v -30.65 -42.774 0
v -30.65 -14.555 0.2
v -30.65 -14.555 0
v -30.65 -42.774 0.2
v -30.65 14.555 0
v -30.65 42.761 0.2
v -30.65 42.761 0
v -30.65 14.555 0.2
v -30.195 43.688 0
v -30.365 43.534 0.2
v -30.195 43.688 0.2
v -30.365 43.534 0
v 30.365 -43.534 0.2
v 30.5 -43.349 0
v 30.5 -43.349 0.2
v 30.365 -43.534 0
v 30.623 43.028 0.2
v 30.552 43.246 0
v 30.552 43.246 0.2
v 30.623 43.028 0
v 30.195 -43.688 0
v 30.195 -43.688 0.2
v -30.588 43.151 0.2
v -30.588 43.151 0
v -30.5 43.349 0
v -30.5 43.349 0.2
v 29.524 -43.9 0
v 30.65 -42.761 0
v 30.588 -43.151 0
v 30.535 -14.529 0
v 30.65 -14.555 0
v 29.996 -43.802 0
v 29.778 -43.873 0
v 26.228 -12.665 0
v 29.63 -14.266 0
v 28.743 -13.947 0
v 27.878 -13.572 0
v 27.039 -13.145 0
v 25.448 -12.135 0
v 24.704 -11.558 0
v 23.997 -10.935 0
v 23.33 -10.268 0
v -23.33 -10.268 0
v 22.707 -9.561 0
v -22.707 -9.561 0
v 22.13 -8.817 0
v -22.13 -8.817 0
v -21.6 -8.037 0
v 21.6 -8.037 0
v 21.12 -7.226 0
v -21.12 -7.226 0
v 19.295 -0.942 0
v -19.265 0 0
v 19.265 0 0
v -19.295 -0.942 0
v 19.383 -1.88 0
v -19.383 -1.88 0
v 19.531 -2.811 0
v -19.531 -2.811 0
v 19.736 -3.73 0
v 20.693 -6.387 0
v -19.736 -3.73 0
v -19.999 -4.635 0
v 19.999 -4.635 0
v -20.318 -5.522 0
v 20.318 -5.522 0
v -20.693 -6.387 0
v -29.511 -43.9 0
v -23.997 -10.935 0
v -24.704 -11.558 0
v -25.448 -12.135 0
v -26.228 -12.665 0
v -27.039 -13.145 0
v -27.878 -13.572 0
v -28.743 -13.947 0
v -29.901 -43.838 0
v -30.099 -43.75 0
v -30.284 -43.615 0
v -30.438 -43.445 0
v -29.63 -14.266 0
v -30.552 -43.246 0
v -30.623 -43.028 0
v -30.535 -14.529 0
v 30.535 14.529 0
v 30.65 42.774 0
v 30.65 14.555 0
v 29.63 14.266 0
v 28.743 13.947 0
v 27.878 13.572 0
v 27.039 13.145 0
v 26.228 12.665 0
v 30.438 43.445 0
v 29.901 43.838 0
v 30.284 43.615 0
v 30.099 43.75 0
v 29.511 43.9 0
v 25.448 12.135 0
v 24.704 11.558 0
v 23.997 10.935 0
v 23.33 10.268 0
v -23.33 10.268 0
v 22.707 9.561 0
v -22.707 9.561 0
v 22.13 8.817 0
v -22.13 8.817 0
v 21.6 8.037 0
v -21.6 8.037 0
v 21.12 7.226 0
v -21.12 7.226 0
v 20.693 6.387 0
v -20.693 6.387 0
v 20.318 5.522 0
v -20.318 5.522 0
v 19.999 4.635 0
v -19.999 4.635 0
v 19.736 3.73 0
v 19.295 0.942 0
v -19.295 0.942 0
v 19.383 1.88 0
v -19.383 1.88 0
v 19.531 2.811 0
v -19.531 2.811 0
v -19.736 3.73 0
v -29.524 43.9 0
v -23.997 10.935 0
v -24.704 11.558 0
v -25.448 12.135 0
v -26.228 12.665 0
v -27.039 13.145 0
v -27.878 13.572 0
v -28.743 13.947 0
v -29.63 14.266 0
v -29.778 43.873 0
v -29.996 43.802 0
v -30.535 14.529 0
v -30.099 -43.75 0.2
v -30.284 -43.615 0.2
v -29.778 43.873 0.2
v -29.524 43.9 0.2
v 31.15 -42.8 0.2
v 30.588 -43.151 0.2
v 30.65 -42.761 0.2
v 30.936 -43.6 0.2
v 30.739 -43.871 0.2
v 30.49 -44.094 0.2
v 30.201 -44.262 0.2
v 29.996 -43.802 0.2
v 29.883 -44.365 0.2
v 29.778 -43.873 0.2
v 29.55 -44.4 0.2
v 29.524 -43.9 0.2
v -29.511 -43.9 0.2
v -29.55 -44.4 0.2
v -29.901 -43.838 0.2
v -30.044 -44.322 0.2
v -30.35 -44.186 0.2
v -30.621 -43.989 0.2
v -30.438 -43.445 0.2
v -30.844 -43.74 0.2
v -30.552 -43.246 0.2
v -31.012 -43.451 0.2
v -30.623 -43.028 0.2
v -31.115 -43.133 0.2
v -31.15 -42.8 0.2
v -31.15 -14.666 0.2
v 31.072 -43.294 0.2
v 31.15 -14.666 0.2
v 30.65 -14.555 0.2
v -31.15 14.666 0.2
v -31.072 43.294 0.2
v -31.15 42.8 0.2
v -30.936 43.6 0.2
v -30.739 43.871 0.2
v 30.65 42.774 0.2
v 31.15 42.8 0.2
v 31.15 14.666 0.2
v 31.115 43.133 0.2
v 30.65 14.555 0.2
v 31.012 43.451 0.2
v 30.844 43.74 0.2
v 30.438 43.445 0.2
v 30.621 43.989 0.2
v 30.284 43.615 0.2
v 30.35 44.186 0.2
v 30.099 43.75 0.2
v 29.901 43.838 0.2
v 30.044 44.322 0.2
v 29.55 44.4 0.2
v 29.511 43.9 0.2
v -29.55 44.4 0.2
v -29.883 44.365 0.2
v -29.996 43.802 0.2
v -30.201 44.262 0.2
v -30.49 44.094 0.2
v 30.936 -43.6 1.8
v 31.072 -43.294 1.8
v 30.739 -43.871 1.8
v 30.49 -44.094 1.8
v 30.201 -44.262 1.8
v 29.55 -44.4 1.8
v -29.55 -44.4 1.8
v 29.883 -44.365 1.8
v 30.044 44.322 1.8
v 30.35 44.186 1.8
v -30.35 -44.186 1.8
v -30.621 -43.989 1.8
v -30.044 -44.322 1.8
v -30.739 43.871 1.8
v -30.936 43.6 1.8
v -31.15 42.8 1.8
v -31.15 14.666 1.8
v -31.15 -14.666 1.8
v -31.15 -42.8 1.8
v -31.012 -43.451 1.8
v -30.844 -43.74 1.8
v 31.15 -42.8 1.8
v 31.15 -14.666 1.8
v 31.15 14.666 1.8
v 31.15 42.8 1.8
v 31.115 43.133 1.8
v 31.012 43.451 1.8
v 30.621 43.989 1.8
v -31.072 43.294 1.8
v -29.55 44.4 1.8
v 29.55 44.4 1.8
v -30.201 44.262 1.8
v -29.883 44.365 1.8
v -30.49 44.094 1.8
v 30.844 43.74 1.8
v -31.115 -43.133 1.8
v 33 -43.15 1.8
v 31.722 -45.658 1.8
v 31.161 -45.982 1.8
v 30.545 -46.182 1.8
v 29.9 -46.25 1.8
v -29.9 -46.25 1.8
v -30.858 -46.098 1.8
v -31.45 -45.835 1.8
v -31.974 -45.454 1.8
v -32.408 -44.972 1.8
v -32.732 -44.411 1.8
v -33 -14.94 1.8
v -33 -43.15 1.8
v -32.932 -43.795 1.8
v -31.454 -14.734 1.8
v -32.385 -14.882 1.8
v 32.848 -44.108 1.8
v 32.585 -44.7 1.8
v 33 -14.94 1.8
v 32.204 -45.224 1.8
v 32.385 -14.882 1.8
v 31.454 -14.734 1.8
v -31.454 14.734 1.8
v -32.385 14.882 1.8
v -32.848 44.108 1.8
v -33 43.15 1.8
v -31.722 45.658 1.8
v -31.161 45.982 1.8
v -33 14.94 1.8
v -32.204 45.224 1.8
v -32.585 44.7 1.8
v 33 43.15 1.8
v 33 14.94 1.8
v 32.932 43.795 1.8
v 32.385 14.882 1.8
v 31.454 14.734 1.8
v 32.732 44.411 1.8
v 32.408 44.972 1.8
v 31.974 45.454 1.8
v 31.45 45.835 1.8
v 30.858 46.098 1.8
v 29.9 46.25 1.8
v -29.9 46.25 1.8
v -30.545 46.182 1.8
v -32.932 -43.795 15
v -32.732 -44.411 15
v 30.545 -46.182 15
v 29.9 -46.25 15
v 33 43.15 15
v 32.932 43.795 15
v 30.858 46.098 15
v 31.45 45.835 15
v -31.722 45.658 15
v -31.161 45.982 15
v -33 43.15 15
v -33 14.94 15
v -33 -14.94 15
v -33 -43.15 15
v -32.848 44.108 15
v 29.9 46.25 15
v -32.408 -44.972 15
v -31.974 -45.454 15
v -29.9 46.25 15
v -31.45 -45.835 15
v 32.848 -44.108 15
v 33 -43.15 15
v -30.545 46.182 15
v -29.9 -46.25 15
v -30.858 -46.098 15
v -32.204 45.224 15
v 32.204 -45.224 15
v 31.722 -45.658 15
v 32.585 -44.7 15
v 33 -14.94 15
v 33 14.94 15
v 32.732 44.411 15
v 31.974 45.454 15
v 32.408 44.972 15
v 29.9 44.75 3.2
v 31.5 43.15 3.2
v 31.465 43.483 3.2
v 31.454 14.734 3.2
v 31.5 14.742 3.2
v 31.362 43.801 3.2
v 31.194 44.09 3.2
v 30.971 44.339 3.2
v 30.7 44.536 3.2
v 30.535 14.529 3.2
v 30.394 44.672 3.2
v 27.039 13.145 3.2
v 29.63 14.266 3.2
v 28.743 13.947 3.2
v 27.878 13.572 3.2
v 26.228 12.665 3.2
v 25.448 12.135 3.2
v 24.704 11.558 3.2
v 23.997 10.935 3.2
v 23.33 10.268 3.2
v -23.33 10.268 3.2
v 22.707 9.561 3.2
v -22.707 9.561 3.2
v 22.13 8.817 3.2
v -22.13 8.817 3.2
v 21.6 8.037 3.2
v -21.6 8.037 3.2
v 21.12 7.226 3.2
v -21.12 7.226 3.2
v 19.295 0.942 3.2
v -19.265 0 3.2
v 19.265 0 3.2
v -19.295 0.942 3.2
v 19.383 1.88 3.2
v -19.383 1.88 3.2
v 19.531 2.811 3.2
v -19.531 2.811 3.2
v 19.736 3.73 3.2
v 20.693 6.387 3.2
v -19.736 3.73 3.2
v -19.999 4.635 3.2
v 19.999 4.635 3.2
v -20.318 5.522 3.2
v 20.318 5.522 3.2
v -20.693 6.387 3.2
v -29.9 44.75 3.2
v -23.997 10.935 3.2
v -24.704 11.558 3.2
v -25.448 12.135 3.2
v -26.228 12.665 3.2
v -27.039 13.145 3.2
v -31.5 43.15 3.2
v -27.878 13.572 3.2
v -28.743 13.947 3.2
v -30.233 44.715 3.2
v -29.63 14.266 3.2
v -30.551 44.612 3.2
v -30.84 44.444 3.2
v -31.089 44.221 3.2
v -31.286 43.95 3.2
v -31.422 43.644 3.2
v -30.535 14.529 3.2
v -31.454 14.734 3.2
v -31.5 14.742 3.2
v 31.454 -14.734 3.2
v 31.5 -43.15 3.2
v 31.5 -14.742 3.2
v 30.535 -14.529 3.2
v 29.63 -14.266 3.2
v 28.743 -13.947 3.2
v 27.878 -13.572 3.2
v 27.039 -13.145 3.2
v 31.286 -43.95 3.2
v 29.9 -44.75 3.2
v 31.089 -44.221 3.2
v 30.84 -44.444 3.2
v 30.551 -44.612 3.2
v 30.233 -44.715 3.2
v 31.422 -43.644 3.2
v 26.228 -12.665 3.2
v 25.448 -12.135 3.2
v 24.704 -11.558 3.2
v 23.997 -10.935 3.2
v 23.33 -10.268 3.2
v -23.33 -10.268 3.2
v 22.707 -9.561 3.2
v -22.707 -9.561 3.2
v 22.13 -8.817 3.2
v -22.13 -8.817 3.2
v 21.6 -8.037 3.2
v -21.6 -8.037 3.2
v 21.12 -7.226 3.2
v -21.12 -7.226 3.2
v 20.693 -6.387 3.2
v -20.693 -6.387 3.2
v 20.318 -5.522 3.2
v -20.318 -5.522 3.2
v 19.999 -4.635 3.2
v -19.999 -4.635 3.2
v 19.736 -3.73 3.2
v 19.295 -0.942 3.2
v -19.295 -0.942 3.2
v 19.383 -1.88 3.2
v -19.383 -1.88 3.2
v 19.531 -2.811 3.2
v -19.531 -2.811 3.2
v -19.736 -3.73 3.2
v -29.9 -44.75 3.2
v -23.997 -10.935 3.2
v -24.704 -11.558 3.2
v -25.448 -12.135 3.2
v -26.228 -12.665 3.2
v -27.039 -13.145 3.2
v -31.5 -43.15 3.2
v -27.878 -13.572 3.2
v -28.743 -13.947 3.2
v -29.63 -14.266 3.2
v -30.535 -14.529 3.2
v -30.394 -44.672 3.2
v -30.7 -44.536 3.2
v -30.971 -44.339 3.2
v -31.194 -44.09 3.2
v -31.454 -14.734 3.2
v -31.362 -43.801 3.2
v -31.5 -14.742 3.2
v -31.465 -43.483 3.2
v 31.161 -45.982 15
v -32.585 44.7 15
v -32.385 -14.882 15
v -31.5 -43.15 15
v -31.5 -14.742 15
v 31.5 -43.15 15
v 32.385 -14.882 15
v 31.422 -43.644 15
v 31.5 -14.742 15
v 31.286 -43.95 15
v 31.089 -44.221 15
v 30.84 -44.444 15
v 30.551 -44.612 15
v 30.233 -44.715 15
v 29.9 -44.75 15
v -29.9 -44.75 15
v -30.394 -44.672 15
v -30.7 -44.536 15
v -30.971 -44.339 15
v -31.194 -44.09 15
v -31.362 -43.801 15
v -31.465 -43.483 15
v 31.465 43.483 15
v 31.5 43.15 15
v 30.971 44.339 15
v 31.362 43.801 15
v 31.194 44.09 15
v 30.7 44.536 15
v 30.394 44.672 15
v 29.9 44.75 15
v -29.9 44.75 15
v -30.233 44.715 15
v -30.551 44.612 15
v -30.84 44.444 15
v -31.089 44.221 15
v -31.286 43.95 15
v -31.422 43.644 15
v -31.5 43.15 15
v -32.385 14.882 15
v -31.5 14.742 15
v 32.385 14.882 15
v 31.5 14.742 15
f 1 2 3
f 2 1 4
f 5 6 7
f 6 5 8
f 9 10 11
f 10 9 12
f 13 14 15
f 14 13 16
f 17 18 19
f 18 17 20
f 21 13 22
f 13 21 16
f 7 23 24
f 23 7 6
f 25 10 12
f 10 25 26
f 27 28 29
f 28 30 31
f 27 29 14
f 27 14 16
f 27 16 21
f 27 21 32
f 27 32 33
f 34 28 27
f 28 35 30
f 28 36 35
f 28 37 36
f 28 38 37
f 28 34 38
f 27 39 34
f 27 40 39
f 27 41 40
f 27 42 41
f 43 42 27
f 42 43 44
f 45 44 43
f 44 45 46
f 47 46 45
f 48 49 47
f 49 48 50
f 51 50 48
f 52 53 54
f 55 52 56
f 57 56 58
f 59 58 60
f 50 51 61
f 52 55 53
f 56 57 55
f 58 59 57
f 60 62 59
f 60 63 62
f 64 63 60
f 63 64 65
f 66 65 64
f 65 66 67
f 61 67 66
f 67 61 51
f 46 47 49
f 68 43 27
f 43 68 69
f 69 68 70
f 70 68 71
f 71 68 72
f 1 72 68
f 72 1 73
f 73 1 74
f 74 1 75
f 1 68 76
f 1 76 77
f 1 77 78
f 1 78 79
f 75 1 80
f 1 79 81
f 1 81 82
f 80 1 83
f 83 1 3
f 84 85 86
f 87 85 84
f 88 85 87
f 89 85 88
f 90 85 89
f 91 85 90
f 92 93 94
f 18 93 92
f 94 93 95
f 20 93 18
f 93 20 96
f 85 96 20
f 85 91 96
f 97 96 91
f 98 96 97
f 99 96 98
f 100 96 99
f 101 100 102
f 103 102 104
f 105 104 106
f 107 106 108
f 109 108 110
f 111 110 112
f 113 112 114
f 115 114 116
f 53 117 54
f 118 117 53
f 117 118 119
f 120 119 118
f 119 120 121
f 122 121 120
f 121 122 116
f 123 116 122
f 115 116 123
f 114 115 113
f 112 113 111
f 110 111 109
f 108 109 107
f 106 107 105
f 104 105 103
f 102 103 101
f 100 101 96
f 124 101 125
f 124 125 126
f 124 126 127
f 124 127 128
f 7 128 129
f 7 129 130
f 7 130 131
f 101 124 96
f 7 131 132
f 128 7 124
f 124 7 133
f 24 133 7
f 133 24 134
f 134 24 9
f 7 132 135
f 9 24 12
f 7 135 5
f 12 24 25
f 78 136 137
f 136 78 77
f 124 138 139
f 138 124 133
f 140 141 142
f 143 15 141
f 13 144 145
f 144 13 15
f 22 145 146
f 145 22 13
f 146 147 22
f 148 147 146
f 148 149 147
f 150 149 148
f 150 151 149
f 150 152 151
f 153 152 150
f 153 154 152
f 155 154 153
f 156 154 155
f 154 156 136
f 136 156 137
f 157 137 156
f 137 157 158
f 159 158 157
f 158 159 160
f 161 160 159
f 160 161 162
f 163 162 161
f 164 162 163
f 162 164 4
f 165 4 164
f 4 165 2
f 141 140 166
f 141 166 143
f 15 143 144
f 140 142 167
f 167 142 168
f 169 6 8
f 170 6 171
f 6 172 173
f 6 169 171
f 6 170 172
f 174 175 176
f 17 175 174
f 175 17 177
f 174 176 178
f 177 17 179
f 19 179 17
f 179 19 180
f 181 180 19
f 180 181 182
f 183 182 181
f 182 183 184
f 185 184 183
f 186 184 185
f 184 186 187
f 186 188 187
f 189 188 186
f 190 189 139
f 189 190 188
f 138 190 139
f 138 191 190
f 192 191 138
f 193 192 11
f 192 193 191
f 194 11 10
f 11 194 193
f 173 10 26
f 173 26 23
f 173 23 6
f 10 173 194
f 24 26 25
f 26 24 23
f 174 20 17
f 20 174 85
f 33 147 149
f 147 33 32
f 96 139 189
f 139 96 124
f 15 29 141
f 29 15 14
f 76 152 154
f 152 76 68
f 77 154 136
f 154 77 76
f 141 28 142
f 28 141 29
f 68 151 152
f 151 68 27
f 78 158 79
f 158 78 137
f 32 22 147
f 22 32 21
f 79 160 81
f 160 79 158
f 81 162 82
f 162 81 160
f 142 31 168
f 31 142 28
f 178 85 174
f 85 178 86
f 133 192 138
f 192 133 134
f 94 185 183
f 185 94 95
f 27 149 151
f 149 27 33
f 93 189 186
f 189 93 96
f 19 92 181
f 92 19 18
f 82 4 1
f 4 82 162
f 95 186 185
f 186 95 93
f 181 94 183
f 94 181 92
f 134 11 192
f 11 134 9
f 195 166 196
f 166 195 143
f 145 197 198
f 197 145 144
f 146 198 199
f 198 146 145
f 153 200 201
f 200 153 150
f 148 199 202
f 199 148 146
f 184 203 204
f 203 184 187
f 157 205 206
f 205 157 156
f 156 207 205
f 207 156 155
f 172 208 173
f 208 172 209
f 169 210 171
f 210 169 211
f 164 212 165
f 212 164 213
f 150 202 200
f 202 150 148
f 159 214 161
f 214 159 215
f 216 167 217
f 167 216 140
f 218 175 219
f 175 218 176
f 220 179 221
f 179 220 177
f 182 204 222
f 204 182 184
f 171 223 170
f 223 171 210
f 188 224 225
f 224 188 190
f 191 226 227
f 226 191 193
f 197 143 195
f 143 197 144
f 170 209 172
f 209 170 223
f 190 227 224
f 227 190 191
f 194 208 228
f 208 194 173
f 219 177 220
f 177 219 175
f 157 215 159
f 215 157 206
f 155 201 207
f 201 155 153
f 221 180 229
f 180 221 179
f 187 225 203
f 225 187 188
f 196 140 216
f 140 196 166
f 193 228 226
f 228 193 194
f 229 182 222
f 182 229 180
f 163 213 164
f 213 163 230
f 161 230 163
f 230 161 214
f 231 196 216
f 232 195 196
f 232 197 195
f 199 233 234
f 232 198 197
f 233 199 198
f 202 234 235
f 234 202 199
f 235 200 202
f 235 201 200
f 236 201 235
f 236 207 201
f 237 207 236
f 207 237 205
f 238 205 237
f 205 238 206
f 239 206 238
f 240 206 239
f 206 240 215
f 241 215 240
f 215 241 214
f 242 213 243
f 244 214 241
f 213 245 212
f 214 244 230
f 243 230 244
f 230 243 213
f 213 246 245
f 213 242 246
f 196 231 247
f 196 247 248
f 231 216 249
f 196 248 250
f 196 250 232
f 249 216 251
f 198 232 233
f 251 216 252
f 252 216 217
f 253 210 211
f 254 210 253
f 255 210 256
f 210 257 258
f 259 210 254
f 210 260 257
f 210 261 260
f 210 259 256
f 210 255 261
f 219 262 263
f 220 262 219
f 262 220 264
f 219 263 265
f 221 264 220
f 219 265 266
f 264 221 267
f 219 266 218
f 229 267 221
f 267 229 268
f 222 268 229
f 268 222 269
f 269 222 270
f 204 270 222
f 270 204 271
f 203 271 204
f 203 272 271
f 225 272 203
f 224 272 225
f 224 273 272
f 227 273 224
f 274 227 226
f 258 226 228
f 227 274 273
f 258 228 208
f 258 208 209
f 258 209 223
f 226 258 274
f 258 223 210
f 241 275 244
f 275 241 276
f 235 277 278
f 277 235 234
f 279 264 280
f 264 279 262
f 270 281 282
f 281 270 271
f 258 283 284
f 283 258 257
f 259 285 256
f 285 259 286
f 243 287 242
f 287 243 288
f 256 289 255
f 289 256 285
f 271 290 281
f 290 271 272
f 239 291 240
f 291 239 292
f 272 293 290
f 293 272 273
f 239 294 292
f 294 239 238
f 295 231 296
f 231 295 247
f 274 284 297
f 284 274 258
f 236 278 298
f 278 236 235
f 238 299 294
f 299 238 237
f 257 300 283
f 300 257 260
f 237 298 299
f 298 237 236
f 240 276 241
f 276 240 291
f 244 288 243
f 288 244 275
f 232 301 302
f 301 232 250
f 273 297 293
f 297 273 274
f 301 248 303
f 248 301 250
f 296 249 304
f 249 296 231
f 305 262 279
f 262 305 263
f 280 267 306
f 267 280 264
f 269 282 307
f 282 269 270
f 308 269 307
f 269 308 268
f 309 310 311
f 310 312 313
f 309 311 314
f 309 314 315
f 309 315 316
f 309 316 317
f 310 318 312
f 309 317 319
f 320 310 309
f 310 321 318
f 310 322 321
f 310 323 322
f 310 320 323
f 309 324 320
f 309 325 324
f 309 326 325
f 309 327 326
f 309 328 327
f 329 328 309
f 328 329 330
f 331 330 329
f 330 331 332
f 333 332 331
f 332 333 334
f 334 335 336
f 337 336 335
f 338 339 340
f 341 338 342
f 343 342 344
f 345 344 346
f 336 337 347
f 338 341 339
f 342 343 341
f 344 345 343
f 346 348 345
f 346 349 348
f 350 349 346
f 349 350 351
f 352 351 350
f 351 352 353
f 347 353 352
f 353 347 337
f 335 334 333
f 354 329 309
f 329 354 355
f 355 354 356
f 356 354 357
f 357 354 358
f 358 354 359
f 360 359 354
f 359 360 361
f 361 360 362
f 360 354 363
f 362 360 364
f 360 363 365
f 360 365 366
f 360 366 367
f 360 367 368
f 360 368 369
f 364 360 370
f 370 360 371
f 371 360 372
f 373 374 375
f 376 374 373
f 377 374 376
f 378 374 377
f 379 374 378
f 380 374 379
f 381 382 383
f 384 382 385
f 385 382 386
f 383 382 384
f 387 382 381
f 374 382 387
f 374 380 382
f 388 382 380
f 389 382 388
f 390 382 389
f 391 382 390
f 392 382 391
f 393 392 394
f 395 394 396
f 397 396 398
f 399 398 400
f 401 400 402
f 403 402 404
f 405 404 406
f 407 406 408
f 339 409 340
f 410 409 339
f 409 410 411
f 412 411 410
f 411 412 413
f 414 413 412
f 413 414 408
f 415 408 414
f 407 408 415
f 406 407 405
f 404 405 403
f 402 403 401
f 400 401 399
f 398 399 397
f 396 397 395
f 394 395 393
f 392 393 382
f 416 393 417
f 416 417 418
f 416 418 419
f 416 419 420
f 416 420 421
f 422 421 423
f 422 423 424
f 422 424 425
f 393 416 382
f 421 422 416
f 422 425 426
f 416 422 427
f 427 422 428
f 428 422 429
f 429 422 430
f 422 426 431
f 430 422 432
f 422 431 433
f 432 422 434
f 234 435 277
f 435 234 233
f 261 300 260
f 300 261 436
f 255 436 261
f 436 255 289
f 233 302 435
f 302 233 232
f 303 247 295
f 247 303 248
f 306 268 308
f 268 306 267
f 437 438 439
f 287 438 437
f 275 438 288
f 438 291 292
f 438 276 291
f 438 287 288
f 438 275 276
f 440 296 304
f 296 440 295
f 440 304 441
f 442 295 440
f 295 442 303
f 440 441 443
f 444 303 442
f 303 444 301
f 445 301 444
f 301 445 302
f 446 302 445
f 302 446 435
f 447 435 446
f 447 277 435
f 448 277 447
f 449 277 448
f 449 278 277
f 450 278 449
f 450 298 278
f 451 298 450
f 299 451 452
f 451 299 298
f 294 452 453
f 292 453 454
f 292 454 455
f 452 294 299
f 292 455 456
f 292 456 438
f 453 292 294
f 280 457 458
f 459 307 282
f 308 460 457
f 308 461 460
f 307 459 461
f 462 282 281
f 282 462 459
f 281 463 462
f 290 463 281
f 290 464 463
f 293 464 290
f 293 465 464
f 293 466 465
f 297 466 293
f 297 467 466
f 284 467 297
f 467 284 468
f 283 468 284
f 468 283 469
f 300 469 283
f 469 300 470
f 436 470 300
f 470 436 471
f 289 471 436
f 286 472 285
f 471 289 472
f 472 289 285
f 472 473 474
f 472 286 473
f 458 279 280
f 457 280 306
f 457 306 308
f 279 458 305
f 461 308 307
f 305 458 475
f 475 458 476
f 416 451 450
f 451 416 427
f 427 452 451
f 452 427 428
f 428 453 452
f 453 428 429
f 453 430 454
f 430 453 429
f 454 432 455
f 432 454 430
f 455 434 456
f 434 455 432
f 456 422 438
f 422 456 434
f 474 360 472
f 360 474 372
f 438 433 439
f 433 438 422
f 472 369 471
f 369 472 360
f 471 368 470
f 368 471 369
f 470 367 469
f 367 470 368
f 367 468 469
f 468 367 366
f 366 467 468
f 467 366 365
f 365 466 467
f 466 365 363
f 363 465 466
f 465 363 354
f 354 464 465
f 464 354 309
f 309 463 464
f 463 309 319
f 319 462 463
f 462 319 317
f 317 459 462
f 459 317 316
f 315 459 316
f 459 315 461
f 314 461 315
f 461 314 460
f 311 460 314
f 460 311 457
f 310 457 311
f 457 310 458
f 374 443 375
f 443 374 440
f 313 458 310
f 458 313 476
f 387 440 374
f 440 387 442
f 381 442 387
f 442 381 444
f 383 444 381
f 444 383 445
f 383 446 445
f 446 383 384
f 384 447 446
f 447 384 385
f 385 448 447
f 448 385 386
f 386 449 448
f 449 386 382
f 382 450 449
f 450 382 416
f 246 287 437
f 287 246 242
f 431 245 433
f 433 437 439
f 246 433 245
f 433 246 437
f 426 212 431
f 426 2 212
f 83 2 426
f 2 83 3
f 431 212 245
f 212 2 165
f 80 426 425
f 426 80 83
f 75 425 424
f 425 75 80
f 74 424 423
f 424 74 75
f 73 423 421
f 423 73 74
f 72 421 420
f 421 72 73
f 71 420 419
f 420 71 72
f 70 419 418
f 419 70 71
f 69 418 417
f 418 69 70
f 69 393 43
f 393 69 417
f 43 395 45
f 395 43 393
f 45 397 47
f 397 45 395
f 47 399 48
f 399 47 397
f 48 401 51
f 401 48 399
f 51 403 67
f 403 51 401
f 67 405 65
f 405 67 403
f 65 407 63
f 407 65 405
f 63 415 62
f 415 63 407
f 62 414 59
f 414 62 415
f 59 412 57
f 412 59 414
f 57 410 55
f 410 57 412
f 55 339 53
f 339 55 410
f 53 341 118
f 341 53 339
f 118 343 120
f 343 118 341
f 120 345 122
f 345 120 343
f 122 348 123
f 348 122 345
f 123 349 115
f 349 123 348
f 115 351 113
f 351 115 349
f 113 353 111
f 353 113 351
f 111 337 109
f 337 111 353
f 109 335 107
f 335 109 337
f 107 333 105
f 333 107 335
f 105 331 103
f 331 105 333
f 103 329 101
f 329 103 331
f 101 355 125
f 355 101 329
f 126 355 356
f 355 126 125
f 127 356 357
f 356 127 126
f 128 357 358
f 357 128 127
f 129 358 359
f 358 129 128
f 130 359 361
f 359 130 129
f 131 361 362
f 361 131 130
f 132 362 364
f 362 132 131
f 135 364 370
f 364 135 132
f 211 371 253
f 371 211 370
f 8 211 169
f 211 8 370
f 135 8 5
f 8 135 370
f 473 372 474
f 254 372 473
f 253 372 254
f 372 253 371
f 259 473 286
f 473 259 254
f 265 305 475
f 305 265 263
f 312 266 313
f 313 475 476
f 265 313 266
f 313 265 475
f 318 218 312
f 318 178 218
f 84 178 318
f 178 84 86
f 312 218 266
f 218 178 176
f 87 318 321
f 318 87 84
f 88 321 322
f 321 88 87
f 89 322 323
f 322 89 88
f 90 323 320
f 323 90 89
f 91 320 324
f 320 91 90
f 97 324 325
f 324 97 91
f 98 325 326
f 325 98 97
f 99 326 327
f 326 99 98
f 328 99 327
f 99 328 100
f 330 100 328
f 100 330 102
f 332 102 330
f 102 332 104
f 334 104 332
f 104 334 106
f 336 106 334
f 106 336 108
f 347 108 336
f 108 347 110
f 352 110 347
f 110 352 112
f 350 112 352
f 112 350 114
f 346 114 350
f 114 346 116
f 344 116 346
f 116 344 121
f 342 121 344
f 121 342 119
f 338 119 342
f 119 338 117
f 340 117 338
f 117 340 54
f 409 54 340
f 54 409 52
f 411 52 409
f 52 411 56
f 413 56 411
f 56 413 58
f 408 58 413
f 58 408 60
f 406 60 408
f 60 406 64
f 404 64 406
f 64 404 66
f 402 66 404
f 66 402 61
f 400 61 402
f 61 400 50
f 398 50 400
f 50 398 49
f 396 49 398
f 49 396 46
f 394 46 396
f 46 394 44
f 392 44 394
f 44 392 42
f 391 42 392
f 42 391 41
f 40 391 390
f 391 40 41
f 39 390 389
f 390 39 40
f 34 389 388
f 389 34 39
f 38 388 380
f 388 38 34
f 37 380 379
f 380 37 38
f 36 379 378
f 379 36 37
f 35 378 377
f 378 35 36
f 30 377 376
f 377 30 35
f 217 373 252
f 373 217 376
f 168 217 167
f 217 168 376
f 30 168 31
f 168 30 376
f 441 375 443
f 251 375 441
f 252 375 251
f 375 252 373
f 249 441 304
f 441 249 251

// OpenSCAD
eps = 0.0001;
$fn = 30;

coin_d = 19;
coin_height = 2.4;

foot = 0.5;

module coin_2d() {
  $fn = 100;
  difference() {
    circle(d=coin_d);
    scale([0.75, 1])
      rotate([0, 0, 45])
        square(coin_d*0.42, center=true);
  }
}

module coin() {
  linear_extrude(0.2)
    offset(-foot)
      coin_2d();
  translate([0, 0, 0.2])
    linear_extrude(coin_height - 0.2)
      coin_2d();
}

card_width = 62.3;
card_height = 88.8;

cavity_slack = 0.7;
wall = 1.5;
flor = 1.4;
deck_thickness = 8;
height_slack = 2.4;

roundoff = 1.6;
protrusion = 1.8;

module cavity_2d() {
  offset(roundoff)
    offset(-roundoff)
      square([card_width + cavity_slack, card_height + cavity_slack], center=true);
}

module protrusion_2d() {
  offset(roundoff)
    offset(-roundoff)
      square([card_width, card_height], center=true);
}

module box_2d() {
 offset(roundoff + wall)
   offset(-roundoff - wall)
     square([card_width + cavity_slack + wall*2, card_height + cavity_slack + wall*2], center=true);
}

module fingers_2d() {
  $fn = 100;
  for (a = [-1, 1])
    scale([a, 1])
      translate([card_width*0.55, 0, 0])
        circle(15);
}

module box() {
  linear_extrude(0.2)
    offset(-foot)
      protrusion_2d();
  
  translate([0, 0, 0.2])
    linear_extrude(protrusion - 0.2)
      protrusion_2d();
  
  translate([0, 0, protrusion])
    linear_extrude(flor)
      box_2d();
  
  translate([0, 0, protrusion + flor]) {
    linear_extrude(flor + deck_thickness + height_slack) {
      difference() {
        box_2d();
        cavity_2d();
      }
    }
  }
}

module piece() {
  difference() {
    box();
    translate([0, 0, -1])
      linear_extrude(100)
        fingers_2d();
  }
}

piece();
